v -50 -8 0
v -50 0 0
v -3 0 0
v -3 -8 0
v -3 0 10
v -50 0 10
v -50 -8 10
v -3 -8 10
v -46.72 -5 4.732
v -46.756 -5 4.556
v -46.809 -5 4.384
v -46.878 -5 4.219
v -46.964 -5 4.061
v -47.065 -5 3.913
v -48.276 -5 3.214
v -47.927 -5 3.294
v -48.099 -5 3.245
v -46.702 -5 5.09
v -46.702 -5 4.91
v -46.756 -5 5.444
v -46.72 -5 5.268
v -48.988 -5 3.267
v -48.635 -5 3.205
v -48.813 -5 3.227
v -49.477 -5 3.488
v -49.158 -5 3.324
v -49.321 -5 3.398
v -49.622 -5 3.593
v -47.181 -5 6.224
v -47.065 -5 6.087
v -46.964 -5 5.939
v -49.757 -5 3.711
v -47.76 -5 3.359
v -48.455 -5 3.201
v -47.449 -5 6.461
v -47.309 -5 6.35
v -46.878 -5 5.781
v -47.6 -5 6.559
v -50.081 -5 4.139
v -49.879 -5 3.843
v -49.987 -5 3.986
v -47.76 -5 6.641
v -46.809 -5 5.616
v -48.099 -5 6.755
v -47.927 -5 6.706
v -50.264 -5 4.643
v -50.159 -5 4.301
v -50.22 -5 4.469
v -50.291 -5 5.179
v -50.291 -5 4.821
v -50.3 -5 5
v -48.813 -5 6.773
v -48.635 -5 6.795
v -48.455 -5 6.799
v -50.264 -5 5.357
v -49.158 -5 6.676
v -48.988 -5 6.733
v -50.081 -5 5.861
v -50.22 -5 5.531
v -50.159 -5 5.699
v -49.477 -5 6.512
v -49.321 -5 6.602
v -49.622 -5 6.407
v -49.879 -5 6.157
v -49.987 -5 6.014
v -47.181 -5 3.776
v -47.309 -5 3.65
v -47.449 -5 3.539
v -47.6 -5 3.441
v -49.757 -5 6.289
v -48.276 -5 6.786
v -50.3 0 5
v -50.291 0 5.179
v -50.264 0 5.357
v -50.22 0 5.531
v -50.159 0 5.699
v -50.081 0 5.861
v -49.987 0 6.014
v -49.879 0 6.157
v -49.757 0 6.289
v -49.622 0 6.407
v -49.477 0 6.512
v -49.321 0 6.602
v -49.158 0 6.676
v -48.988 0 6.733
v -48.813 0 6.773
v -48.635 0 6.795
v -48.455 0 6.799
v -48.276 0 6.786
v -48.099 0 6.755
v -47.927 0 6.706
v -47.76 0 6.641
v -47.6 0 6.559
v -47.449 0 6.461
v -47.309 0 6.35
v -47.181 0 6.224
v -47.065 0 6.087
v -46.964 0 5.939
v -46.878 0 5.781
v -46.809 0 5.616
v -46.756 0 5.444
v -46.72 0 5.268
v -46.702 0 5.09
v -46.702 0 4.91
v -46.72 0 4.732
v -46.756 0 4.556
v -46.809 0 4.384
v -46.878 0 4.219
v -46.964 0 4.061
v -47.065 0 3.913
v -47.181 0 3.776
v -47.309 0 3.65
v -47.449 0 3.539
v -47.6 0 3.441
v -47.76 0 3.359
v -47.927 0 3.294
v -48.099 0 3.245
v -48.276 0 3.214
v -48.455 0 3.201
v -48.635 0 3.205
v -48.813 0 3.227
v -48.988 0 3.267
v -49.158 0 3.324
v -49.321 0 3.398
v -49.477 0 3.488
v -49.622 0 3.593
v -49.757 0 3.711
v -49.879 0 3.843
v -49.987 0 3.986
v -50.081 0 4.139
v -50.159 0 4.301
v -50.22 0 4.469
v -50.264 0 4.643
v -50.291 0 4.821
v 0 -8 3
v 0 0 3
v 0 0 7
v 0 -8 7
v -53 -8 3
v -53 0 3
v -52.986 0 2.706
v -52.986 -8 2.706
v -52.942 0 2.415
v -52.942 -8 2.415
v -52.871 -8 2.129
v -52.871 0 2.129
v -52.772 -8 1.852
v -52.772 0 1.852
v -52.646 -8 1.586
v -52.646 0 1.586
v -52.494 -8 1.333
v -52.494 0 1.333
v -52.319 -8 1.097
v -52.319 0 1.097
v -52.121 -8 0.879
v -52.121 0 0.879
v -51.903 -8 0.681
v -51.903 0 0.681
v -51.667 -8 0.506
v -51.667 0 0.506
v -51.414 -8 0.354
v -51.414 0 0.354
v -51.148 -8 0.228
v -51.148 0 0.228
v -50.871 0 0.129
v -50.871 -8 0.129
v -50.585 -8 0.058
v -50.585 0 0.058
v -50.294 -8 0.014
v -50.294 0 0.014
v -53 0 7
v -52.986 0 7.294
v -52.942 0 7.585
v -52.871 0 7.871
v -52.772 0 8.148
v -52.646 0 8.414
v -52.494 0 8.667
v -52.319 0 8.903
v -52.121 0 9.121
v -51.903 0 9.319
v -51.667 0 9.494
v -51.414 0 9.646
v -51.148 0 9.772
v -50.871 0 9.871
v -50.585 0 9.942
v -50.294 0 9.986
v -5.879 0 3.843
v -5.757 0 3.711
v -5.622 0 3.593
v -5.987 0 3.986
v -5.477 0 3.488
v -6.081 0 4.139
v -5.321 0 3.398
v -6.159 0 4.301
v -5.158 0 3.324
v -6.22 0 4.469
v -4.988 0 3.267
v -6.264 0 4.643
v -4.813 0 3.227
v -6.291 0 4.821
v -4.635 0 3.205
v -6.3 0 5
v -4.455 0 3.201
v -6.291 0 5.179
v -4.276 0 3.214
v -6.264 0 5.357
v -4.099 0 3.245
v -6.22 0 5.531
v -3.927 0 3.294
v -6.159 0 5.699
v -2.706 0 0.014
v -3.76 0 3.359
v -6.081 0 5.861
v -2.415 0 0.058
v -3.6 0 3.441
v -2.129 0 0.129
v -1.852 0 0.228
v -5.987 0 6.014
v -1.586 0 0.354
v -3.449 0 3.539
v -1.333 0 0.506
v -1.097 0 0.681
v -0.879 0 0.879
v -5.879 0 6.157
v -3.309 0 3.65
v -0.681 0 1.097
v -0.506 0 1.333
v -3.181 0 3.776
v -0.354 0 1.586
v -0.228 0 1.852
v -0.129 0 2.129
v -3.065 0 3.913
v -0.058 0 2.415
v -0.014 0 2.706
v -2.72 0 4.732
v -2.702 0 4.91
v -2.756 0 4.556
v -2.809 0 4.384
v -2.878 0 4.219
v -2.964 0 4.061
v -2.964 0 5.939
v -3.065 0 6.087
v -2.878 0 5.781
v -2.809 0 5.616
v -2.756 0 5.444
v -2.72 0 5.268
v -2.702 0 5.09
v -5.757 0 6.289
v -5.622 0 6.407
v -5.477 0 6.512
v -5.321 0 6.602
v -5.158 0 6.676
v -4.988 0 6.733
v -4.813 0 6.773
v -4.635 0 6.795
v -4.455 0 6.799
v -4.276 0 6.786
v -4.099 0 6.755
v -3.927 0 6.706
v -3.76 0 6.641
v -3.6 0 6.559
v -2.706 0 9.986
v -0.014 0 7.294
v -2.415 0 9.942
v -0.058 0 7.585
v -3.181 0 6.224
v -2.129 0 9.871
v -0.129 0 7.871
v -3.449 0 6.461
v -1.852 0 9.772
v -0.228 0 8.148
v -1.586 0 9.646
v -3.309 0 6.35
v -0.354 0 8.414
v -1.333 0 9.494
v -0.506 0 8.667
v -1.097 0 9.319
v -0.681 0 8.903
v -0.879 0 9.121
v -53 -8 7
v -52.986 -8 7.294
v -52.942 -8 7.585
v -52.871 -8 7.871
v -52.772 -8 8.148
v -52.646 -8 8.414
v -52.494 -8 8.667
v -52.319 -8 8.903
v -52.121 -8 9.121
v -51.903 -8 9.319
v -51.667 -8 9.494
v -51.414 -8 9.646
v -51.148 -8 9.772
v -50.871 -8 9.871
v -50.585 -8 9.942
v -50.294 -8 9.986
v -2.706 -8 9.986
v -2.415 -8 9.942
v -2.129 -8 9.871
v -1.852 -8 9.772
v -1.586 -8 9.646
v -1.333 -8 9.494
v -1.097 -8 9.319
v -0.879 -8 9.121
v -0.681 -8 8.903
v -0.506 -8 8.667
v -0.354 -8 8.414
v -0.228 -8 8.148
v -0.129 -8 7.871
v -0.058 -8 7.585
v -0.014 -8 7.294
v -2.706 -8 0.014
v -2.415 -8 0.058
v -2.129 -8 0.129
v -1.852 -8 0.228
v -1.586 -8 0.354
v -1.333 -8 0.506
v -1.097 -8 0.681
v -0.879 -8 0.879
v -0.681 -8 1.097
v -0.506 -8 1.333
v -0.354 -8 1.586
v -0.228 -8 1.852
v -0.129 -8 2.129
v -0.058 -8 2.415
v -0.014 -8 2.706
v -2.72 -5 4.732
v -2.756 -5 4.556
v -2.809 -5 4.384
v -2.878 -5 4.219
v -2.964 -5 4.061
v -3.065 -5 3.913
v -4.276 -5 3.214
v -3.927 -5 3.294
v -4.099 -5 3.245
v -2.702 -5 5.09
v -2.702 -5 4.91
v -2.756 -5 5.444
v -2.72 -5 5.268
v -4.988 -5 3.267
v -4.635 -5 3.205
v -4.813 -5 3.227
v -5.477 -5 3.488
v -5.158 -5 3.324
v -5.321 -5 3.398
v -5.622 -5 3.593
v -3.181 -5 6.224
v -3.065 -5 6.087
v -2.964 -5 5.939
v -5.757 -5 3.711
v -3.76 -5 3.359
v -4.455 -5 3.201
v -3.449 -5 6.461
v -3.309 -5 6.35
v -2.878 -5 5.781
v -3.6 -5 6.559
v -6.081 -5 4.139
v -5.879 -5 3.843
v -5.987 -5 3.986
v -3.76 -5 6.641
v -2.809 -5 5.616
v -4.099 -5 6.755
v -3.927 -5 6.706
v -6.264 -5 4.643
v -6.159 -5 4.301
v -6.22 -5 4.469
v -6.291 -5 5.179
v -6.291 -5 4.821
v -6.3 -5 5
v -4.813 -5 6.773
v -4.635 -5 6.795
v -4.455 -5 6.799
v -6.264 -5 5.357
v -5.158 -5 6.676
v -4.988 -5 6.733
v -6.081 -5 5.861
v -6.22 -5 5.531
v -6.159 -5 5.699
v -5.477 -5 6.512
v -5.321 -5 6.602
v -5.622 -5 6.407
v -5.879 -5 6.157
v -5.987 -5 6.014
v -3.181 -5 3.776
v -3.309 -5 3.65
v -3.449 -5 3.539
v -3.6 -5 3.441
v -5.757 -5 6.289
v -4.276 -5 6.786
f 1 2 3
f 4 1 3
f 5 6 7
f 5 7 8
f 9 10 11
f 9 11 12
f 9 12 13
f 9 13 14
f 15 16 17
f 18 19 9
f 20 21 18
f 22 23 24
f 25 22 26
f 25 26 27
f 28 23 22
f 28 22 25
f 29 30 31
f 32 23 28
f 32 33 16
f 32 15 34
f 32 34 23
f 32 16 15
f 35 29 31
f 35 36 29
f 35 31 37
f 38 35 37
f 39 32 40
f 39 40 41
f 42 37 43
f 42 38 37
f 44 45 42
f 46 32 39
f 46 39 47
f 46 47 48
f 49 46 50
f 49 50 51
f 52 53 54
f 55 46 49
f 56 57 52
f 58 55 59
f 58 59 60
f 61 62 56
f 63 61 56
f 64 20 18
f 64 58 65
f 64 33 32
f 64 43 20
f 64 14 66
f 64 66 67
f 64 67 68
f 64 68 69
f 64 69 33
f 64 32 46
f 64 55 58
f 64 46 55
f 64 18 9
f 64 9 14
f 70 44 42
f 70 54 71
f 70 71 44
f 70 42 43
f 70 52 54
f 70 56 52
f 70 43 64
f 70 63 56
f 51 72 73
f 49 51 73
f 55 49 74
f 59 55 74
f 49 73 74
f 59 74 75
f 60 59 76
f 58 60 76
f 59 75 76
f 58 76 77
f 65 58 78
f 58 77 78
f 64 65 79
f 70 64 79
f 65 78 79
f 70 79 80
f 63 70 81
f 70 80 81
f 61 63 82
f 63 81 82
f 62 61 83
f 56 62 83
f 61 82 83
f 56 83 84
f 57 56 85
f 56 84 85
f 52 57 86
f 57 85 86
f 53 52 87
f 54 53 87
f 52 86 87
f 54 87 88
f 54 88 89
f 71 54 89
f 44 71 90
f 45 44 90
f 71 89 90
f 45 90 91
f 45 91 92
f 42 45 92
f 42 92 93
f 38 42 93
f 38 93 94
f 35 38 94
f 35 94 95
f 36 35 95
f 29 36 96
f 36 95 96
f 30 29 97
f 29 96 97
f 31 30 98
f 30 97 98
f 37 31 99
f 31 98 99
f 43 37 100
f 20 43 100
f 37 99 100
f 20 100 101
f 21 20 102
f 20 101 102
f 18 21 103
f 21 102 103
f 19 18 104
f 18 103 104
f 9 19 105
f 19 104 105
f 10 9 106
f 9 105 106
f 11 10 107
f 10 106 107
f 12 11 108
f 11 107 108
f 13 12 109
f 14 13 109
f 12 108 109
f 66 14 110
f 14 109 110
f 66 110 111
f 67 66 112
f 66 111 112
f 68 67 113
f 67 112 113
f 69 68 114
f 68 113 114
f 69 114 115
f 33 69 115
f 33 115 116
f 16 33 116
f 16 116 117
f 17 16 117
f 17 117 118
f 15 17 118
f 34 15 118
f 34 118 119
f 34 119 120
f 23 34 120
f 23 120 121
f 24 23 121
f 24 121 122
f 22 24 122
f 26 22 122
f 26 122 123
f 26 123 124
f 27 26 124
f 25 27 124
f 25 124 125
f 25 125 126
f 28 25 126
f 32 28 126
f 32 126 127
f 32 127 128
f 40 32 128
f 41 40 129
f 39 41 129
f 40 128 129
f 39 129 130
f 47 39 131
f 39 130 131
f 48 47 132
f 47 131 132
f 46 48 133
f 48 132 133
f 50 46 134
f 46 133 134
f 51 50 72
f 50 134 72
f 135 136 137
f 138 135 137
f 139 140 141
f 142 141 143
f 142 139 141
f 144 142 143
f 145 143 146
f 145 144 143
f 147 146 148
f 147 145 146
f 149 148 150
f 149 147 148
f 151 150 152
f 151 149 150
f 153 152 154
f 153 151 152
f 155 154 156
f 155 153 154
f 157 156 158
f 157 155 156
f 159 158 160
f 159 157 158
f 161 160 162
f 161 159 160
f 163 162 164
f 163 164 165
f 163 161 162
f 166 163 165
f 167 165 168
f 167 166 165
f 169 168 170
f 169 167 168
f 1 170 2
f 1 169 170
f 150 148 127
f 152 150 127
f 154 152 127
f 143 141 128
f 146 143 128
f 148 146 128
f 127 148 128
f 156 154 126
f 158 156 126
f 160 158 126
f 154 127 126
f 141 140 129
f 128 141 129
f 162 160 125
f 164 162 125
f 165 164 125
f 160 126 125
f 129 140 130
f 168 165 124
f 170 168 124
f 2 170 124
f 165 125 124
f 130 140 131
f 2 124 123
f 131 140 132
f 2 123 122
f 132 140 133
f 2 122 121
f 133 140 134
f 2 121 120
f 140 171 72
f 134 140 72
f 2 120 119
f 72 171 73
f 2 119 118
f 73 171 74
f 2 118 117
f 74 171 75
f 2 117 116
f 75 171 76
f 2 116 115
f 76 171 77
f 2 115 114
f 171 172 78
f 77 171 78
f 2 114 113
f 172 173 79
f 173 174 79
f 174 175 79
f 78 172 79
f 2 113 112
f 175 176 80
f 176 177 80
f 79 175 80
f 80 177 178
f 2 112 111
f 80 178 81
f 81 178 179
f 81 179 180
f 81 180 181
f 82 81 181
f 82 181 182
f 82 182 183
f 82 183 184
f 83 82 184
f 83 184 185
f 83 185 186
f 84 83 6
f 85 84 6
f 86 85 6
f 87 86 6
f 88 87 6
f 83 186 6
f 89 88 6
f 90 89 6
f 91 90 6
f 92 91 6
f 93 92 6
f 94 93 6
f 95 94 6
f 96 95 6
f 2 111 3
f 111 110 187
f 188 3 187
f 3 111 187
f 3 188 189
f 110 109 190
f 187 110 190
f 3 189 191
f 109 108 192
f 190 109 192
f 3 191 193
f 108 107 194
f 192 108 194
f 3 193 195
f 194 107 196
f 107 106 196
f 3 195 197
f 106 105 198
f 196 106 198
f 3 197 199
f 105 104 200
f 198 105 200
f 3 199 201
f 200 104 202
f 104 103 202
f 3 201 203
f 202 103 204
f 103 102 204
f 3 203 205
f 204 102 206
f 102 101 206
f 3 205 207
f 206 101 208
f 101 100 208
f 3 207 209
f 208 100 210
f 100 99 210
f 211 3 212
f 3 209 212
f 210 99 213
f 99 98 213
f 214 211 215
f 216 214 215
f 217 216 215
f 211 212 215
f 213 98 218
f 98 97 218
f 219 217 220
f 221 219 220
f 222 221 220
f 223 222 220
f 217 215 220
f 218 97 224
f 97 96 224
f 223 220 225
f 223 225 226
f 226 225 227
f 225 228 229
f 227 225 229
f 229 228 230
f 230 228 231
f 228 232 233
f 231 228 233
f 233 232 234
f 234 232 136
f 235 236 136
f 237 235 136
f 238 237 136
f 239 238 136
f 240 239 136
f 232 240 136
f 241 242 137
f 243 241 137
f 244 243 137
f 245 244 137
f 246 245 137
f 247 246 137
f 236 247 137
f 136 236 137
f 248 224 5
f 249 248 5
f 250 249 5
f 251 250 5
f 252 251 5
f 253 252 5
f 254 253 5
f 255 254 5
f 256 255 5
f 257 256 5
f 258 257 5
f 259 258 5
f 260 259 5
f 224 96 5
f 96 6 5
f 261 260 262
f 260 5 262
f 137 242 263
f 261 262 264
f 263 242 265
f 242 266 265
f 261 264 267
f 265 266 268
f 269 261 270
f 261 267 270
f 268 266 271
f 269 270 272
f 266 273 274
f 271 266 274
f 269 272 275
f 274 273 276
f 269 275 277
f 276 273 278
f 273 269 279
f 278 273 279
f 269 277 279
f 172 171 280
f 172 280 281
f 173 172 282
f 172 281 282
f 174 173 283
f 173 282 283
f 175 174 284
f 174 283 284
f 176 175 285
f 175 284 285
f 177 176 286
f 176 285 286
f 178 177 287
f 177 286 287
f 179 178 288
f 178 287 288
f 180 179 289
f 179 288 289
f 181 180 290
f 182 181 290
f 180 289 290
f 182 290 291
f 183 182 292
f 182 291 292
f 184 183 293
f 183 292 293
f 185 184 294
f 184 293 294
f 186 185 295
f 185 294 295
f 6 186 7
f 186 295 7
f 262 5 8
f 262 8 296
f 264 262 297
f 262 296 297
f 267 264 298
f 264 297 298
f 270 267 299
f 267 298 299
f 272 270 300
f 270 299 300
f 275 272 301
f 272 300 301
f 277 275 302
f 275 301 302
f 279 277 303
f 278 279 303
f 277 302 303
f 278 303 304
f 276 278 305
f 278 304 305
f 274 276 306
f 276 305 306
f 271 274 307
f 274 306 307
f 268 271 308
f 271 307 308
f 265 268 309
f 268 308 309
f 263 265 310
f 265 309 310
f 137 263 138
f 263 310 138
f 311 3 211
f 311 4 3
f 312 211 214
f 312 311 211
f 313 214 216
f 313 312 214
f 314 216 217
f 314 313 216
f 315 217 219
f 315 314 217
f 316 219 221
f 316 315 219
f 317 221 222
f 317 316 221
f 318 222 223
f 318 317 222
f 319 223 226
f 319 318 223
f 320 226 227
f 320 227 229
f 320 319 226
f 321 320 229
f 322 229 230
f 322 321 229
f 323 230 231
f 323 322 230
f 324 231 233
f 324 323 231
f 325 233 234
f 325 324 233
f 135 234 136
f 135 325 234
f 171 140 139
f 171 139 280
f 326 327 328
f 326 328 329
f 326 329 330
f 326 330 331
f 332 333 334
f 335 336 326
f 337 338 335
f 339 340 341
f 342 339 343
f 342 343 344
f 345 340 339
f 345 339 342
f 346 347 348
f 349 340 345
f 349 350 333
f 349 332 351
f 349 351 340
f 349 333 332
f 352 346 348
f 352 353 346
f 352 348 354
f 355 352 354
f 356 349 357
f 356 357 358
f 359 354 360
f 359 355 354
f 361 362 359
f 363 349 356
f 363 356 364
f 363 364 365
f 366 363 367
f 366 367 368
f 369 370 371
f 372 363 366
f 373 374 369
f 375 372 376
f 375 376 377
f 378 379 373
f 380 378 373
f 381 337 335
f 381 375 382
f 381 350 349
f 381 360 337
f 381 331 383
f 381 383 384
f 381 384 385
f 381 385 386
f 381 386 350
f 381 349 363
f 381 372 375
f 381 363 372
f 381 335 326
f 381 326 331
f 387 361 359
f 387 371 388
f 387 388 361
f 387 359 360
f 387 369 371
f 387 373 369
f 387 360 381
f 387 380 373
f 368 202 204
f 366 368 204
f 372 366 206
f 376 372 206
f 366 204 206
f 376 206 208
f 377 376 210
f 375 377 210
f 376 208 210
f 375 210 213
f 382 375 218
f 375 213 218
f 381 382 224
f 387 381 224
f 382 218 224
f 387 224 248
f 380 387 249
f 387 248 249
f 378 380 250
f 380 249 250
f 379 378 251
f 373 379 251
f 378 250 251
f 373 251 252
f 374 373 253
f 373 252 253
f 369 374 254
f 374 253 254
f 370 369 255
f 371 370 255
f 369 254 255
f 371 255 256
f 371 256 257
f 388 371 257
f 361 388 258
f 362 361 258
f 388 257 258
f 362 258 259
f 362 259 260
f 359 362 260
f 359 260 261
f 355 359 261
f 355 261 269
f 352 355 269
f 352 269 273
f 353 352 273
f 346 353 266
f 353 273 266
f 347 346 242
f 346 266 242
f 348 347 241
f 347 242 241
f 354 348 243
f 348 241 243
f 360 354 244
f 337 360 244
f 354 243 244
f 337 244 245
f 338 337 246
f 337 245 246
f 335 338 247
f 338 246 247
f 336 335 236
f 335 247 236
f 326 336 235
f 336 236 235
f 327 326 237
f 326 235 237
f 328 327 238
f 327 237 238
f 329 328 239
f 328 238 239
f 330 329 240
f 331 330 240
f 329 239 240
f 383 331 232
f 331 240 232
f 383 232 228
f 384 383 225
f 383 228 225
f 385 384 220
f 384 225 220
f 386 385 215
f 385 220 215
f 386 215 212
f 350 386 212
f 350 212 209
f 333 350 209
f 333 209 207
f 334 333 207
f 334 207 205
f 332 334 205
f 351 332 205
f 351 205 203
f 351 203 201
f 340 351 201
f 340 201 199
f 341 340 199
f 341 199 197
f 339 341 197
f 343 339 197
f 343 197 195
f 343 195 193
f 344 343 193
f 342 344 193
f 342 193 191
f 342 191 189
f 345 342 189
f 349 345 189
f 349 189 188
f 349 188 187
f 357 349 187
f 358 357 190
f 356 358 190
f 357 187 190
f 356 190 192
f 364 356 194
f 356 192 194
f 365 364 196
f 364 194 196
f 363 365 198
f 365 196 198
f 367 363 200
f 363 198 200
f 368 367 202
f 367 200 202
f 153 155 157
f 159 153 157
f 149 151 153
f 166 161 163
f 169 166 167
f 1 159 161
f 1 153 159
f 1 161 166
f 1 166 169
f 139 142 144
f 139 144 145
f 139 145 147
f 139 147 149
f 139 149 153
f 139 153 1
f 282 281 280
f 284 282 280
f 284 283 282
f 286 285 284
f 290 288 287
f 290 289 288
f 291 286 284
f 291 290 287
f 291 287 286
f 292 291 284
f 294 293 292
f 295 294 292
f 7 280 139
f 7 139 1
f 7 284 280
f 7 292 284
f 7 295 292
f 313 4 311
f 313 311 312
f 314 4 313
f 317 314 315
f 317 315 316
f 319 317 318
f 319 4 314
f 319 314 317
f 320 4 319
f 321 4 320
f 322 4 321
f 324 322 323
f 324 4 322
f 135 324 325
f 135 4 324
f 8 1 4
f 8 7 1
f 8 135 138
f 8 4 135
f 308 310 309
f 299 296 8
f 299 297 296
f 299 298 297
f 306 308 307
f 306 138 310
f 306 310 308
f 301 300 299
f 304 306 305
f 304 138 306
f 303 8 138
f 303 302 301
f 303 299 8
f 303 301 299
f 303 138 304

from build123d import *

# Parameters (mm, degrees)
F0_W     = 53
F0_H     = 10
F0_R     = 1.8
F1_DEPTH = 8
F2_R     = 1.8
F3_DEPTH = 5
F4_R     = 3


with BuildPart() as f1:
    # F0 (on Front) → F1 (new body)
    with BuildSketch(Plane.XZ):
        with Locations((-26.5, 5)):
            Rectangle(F0_W, F0_H)
        with Locations((-48.5, 5)):
            Circle(F0_R, mode=Mode.SUBTRACT)
        with Locations((-4.5, 5)):
            Circle(F0_R, mode=Mode.SUBTRACT)
        with Locations((-48.5, 5)):
            Circle(F0_R)
        with Locations((-4.5, 5)):
            Circle(F0_R)
    extrude(amount=F1_DEPTH)

    # F2 (on face) → F3 (cut)
    with BuildSketch(Plane(origin=(0, 0, 0), x_dir=(-1, 0, 0), z_dir=(0, 1, 0))):
        with Locations((4.5, 5)):
            Circle(F2_R)
        with Locations((48.5, 5)):
            Circle(F2_R)
    extrude(amount=-F3_DEPTH, mode=Mode.SUBTRACT)

    # F4
    f4_edges = [f1.edges().sort_by_distance(p)[0] for p in [
        (0, -4, 10),
        (0, -4, 0),
        (-53, -4, 10),
        (-53, -4, 0),
    ]]
    fillet(f4_edges, radius=F4_R)


solid = f1.part
